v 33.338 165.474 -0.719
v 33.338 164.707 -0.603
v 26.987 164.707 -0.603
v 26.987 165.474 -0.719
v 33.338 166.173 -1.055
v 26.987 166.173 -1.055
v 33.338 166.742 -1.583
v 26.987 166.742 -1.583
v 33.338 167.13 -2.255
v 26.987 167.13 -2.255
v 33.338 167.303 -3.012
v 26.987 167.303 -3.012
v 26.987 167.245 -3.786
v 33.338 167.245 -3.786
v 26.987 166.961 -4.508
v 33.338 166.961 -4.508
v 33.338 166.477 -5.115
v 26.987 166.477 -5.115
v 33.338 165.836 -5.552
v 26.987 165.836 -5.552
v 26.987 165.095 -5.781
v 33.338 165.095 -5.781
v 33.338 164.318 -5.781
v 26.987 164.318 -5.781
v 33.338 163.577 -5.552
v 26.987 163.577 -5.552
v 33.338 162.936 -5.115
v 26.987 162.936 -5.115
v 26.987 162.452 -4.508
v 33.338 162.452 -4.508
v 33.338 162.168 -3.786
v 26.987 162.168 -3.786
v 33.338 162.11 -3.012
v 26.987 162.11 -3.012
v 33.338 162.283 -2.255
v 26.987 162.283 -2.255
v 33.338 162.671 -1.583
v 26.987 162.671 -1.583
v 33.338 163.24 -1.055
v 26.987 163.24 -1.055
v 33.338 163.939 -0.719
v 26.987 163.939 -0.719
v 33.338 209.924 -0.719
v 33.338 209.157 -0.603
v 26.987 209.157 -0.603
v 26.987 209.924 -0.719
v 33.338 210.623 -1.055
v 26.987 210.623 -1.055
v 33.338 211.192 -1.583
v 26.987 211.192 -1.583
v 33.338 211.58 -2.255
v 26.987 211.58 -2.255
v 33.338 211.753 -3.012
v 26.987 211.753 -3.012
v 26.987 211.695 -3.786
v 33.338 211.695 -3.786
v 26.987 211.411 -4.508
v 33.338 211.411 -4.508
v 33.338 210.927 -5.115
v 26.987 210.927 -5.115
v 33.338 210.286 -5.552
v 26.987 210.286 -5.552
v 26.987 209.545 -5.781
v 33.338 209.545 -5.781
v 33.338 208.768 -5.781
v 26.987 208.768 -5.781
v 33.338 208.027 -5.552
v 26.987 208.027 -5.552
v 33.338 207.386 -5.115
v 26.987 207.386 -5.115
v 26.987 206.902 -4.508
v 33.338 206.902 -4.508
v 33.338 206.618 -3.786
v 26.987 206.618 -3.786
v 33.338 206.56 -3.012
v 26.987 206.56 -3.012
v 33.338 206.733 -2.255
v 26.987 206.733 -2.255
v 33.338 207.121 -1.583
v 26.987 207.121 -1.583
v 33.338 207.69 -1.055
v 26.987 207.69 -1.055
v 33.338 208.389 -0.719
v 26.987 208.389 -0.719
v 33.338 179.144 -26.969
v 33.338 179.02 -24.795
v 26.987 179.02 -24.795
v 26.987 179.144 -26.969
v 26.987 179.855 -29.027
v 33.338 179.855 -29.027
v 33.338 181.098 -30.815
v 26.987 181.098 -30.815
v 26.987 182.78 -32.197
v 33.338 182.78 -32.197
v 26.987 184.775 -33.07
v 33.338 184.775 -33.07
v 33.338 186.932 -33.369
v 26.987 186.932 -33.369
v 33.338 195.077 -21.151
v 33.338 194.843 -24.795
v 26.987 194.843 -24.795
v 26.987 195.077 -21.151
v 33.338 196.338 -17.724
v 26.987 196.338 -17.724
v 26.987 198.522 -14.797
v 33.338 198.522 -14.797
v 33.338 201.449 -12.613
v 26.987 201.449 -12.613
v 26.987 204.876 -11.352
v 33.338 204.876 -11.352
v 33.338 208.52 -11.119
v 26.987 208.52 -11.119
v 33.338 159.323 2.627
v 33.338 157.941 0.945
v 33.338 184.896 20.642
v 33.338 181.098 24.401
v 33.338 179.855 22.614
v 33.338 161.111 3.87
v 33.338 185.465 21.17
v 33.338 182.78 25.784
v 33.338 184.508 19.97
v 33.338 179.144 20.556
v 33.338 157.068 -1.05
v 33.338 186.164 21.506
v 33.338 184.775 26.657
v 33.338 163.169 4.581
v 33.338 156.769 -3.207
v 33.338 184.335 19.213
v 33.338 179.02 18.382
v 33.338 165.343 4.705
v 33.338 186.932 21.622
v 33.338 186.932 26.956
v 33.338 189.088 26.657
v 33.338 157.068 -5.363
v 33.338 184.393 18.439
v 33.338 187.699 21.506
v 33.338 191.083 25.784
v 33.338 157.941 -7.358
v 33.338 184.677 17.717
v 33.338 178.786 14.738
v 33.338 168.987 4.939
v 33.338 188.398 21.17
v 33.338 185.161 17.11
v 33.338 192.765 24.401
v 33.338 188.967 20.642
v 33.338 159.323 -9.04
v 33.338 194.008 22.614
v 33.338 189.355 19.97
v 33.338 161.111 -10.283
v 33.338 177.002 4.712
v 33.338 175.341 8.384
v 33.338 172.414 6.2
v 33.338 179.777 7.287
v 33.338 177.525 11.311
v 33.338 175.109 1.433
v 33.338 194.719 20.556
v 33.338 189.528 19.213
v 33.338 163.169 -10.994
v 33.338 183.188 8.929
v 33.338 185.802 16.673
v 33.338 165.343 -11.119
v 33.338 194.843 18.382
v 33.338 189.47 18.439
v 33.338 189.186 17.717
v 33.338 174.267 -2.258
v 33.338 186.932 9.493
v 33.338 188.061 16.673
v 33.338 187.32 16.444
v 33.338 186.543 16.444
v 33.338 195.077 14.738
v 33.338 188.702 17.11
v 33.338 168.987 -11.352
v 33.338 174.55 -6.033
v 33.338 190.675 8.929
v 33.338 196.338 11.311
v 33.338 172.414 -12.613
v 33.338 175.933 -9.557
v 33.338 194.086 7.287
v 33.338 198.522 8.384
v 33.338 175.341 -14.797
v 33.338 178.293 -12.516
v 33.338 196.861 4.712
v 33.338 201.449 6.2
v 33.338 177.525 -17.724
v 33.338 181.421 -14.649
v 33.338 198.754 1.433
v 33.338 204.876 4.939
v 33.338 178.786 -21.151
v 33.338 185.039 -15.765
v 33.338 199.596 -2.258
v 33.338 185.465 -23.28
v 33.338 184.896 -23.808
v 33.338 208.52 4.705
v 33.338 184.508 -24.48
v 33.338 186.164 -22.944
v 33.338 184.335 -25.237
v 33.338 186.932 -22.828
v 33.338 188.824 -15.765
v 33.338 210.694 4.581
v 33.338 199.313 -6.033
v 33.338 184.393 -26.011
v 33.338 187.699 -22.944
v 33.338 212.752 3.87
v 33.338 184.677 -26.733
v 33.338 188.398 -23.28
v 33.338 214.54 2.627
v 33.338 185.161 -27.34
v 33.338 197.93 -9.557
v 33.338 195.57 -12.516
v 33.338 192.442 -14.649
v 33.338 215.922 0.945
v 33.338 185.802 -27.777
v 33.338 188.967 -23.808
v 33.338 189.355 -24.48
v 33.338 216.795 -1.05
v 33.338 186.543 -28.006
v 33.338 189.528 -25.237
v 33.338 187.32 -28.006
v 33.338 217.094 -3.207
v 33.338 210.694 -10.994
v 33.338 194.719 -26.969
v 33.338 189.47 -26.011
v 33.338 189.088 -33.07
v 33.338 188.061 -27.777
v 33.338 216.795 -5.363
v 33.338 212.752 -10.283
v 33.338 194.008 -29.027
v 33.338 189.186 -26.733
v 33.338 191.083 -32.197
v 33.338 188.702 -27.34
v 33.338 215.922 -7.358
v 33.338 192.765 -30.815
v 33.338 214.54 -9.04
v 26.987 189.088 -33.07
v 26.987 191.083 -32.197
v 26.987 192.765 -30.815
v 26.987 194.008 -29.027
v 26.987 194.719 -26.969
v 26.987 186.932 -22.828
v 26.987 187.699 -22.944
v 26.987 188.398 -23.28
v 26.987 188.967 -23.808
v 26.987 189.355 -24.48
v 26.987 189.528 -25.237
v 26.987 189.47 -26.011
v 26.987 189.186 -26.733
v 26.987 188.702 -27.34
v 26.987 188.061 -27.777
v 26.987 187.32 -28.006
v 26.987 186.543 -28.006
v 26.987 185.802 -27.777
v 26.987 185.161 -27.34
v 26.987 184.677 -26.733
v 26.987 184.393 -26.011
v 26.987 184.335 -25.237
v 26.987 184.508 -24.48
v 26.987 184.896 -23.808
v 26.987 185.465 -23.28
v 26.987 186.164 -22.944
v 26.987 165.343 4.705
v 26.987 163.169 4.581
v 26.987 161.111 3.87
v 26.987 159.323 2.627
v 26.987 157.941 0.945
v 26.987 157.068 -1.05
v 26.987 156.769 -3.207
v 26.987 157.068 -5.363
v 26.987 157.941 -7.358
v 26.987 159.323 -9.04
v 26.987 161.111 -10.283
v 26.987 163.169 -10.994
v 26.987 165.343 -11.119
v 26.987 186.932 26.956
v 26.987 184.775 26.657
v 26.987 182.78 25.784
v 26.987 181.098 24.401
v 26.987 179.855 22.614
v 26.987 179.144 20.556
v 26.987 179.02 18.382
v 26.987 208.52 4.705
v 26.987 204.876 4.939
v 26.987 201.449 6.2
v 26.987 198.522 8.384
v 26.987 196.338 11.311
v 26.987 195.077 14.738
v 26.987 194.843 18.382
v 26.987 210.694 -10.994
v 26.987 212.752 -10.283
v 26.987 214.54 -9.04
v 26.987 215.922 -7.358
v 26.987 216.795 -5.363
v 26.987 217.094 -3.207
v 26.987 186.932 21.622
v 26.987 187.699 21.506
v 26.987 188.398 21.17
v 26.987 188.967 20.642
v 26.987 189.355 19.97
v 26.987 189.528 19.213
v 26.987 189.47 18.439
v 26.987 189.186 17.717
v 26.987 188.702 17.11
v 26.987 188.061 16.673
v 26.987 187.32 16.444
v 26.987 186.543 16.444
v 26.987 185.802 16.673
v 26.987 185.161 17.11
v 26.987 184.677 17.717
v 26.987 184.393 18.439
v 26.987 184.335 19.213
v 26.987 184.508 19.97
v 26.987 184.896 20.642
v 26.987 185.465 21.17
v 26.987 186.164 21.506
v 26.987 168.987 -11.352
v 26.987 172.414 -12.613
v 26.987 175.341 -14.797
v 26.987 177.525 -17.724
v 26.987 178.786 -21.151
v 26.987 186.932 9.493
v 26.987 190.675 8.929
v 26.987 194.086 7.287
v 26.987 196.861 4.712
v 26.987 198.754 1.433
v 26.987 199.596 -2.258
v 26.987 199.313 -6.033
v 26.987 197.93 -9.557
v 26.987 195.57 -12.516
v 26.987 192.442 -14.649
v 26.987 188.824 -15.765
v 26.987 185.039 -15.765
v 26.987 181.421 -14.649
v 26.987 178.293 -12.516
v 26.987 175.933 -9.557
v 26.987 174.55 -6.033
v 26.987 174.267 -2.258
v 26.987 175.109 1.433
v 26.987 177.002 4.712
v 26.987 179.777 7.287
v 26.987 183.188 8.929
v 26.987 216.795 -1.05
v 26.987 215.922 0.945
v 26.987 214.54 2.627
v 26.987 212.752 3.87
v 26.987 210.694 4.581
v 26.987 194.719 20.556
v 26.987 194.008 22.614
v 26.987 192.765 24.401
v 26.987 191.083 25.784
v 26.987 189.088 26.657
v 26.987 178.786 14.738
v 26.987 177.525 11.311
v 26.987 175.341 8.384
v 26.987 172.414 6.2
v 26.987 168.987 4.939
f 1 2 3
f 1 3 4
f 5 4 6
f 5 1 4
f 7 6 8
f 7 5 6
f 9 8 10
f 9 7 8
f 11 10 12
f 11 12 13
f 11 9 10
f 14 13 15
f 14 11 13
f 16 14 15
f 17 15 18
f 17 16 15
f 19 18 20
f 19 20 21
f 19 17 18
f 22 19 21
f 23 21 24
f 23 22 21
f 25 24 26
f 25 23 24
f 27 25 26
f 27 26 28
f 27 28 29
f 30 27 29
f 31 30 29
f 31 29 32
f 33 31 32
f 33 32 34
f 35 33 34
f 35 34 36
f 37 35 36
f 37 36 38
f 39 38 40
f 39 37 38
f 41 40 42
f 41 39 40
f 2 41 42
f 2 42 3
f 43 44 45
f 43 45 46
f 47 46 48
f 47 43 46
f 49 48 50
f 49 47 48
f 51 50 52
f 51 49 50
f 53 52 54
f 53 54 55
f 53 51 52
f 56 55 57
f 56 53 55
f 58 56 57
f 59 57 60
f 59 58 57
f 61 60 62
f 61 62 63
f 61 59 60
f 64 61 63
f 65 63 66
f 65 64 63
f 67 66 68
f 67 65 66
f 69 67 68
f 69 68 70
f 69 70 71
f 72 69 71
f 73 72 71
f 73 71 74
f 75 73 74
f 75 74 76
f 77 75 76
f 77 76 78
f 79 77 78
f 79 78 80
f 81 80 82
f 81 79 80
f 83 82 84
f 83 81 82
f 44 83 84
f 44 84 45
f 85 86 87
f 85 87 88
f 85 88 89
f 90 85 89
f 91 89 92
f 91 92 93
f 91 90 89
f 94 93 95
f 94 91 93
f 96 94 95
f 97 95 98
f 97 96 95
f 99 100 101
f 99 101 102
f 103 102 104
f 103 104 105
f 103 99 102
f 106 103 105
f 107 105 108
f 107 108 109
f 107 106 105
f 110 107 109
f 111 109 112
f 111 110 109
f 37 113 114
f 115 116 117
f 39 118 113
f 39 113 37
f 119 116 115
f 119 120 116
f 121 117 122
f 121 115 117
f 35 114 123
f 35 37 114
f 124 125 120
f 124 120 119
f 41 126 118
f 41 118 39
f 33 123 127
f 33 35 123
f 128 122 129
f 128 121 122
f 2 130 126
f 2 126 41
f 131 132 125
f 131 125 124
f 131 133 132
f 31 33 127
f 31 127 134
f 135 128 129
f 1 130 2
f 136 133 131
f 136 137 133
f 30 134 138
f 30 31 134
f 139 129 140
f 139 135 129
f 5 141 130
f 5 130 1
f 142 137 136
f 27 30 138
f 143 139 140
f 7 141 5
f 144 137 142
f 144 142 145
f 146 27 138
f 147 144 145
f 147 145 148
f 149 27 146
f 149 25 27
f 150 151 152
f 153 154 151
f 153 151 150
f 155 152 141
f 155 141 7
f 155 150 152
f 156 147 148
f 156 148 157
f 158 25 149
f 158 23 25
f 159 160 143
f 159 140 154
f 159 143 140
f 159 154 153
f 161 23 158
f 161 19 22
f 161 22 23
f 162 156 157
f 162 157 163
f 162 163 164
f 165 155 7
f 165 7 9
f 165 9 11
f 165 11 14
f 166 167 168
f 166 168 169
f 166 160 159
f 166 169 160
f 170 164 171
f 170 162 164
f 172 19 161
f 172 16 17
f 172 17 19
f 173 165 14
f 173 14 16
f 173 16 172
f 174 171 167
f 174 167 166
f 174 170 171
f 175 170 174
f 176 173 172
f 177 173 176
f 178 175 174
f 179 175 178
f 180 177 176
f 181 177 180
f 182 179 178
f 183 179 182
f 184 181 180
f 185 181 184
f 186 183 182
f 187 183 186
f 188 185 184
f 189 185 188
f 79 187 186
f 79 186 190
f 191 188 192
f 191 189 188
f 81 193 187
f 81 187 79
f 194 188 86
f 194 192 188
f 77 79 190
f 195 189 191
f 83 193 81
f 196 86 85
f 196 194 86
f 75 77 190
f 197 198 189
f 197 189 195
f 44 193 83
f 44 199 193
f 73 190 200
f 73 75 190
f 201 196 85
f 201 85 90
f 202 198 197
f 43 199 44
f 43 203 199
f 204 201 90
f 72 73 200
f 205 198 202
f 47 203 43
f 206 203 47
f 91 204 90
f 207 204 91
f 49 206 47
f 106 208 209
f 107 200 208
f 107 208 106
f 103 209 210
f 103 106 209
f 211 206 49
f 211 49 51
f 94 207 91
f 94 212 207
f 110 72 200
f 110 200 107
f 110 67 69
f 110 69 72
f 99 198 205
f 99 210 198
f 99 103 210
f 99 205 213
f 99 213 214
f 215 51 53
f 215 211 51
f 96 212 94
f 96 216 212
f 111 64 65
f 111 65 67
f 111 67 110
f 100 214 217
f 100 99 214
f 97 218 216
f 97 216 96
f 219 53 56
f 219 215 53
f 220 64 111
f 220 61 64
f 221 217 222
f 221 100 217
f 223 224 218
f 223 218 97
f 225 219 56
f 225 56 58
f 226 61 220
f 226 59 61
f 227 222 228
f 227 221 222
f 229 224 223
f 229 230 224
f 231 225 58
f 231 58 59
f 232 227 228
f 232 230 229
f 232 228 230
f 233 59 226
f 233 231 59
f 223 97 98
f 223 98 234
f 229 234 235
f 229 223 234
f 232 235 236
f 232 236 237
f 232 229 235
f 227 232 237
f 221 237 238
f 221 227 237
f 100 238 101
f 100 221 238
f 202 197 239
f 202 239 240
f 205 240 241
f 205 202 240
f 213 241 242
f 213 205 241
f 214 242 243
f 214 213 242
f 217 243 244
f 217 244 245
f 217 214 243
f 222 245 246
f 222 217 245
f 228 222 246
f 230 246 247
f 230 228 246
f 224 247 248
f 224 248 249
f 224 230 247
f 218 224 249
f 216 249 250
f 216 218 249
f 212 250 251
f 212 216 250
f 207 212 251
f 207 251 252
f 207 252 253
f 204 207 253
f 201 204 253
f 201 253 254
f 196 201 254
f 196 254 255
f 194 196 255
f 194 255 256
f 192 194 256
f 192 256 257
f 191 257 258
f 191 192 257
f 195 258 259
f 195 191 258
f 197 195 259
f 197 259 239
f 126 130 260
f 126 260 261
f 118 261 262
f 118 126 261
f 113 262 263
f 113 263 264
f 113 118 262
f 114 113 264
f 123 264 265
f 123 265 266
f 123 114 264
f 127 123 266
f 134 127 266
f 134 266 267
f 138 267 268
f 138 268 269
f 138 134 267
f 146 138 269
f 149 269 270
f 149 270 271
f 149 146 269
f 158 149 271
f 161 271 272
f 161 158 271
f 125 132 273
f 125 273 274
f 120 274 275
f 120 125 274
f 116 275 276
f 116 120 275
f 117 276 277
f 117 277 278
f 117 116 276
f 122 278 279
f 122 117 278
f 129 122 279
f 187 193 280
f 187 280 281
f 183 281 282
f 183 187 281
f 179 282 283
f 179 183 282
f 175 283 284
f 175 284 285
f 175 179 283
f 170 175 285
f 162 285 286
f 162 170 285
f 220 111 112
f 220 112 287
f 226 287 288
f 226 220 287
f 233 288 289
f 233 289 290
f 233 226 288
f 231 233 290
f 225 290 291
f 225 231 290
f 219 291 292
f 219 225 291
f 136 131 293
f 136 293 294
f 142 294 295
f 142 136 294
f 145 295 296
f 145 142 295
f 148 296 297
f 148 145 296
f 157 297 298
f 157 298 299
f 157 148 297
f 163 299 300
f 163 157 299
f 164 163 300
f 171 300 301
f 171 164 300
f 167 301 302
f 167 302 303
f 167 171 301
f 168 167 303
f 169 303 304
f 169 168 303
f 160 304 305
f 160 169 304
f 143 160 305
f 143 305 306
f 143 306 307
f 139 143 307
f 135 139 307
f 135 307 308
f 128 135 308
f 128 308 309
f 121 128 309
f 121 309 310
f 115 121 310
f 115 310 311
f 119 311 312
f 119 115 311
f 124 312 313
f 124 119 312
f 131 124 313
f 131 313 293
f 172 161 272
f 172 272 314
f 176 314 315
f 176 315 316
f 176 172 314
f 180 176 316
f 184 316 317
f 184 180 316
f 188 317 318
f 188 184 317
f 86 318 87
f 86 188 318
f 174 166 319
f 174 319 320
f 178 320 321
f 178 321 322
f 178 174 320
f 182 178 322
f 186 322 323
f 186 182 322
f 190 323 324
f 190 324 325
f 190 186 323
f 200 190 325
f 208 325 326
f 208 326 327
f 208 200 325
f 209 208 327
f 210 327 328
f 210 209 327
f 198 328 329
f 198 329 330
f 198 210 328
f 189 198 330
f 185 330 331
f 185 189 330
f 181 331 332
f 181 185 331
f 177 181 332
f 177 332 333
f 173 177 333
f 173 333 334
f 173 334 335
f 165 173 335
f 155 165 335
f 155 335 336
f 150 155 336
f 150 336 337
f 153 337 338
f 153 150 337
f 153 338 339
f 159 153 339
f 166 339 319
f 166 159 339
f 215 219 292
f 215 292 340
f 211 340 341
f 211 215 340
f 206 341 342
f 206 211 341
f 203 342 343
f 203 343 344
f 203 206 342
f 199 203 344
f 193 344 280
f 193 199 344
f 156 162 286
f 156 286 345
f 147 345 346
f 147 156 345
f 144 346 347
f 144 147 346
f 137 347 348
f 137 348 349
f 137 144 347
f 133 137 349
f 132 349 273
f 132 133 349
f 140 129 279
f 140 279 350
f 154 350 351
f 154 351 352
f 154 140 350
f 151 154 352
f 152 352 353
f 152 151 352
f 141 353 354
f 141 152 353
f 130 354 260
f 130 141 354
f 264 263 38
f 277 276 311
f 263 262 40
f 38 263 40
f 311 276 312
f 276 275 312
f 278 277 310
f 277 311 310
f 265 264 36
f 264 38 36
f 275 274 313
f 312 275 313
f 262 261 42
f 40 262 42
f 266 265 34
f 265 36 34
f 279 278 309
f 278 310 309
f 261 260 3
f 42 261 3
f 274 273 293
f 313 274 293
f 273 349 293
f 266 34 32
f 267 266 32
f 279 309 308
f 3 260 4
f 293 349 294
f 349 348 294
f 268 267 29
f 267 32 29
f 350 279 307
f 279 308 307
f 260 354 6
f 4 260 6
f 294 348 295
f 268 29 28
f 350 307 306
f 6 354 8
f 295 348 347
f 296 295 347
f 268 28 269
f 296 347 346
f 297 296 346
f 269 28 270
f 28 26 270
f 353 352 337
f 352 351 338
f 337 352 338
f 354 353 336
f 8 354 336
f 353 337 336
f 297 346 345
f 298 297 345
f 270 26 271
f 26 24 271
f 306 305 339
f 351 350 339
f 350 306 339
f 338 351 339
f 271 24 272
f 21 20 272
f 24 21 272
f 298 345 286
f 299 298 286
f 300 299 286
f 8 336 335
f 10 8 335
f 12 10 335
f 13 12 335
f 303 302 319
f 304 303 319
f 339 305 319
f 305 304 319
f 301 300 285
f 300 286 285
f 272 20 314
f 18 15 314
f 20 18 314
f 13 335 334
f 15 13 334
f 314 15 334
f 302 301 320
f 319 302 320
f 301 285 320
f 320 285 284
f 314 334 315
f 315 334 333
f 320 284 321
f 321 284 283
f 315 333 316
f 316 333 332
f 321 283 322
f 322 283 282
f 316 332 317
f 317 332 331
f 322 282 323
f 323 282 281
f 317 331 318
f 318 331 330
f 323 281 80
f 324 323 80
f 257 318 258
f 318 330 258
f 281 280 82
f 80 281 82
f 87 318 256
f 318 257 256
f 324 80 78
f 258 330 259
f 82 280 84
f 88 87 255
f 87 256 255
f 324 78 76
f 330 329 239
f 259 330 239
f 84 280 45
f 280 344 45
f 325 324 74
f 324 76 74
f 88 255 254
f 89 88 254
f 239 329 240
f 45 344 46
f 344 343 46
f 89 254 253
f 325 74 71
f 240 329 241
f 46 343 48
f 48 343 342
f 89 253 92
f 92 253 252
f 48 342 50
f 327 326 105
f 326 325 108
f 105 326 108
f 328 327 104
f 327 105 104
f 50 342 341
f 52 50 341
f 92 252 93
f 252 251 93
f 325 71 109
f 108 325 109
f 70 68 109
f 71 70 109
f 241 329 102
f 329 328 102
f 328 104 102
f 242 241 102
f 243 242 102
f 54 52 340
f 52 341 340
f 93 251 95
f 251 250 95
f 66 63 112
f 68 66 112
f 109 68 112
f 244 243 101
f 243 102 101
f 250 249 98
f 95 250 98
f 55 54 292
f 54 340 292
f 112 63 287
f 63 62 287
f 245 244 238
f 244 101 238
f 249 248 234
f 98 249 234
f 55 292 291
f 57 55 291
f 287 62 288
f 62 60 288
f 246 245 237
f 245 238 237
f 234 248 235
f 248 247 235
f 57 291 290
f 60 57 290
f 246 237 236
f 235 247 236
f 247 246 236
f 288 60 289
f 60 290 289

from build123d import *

# Parameters (mm, degrees)
SKETCH1_R           = 12.7
SKETCH1_R_2         = 2.6035
BOSS_EXTRUDE1_DEPTH = 6.35


with BuildPart() as part:
    # Sketch1 → Boss-Extrude1 (new body)
    with BuildSketch(Plane.ZY.offset(-33.3375)):
        with BuildLine():
            ThreePointArc((26.955926991, 186.931527045), (24.401493508, 181.09830314), (18.382320409, 179.019556705))
            ThreePointArc((18.382320409, 179.019556705), (8.384293755, 175.340660282), (4.705397332, 165.342633628))
            ThreePointArc((4.705397332, 165.342633628), (2.626650896, 159.323460528), (-3.206573009, 156.769027045))
            ThreePointArc((-3.206573009, 156.769027045), (-9.039796914, 159.323460528), (-11.118543349, 165.342633628))
            ThreePointArc((-11.118543349, 165.342633628), (-14.797439772, 175.340660282), (-24.795466426, 179.019556705))
            ThreePointArc((-24.795466426, 179.019556705), (-30.814639526, 181.09830314), (-33.369073009, 186.931527045))
            ThreePointArc((-33.369073009, 186.931527045), (-30.814639526, 192.76475095), (-24.795466426, 194.843497386))
            ThreePointArc((-24.795466426, 194.843497386), (-14.797439772, 198.522393809), (-11.118543349, 208.520420462))
            ThreePointArc((-11.118543349, 208.520420462), (-9.039796914, 214.539593562), (-3.206573009, 217.094027045))
            ThreePointArc((-3.206573009, 217.094027045), (2.626650896, 214.539593562), (4.705397332, 208.520420462))
            ThreePointArc((4.705397332, 208.520420462), (8.384293755, 198.522393809), (18.382320409, 194.843497386))
            ThreePointArc((18.382320409, 194.843497386), (24.401493508, 192.76475095), (26.955926991, 186.931527045))
        make_face()
        with Locations((-3.206573009, 186.931527045)):
            Circle(SKETCH1_R, mode=Mode.SUBTRACT)
        with Locations((19.018426991, 186.931527045)):
            Circle(SKETCH1_R_2, mode=Mode.SUBTRACT)
        with Locations((-3.206573009, 164.706527045)):
            Circle(SKETCH1_R_2, mode=Mode.SUBTRACT)
        with Locations((-25.431573009, 186.931527045)):
            Circle(SKETCH1_R_2, mode=Mode.SUBTRACT)
        with Locations((-3.206573009, 209.156527045)):
            Circle(SKETCH1_R_2, mode=Mode.SUBTRACT)
    extrude(amount=BOSS_EXTRUDE1_DEPTH)


solid = part.part
